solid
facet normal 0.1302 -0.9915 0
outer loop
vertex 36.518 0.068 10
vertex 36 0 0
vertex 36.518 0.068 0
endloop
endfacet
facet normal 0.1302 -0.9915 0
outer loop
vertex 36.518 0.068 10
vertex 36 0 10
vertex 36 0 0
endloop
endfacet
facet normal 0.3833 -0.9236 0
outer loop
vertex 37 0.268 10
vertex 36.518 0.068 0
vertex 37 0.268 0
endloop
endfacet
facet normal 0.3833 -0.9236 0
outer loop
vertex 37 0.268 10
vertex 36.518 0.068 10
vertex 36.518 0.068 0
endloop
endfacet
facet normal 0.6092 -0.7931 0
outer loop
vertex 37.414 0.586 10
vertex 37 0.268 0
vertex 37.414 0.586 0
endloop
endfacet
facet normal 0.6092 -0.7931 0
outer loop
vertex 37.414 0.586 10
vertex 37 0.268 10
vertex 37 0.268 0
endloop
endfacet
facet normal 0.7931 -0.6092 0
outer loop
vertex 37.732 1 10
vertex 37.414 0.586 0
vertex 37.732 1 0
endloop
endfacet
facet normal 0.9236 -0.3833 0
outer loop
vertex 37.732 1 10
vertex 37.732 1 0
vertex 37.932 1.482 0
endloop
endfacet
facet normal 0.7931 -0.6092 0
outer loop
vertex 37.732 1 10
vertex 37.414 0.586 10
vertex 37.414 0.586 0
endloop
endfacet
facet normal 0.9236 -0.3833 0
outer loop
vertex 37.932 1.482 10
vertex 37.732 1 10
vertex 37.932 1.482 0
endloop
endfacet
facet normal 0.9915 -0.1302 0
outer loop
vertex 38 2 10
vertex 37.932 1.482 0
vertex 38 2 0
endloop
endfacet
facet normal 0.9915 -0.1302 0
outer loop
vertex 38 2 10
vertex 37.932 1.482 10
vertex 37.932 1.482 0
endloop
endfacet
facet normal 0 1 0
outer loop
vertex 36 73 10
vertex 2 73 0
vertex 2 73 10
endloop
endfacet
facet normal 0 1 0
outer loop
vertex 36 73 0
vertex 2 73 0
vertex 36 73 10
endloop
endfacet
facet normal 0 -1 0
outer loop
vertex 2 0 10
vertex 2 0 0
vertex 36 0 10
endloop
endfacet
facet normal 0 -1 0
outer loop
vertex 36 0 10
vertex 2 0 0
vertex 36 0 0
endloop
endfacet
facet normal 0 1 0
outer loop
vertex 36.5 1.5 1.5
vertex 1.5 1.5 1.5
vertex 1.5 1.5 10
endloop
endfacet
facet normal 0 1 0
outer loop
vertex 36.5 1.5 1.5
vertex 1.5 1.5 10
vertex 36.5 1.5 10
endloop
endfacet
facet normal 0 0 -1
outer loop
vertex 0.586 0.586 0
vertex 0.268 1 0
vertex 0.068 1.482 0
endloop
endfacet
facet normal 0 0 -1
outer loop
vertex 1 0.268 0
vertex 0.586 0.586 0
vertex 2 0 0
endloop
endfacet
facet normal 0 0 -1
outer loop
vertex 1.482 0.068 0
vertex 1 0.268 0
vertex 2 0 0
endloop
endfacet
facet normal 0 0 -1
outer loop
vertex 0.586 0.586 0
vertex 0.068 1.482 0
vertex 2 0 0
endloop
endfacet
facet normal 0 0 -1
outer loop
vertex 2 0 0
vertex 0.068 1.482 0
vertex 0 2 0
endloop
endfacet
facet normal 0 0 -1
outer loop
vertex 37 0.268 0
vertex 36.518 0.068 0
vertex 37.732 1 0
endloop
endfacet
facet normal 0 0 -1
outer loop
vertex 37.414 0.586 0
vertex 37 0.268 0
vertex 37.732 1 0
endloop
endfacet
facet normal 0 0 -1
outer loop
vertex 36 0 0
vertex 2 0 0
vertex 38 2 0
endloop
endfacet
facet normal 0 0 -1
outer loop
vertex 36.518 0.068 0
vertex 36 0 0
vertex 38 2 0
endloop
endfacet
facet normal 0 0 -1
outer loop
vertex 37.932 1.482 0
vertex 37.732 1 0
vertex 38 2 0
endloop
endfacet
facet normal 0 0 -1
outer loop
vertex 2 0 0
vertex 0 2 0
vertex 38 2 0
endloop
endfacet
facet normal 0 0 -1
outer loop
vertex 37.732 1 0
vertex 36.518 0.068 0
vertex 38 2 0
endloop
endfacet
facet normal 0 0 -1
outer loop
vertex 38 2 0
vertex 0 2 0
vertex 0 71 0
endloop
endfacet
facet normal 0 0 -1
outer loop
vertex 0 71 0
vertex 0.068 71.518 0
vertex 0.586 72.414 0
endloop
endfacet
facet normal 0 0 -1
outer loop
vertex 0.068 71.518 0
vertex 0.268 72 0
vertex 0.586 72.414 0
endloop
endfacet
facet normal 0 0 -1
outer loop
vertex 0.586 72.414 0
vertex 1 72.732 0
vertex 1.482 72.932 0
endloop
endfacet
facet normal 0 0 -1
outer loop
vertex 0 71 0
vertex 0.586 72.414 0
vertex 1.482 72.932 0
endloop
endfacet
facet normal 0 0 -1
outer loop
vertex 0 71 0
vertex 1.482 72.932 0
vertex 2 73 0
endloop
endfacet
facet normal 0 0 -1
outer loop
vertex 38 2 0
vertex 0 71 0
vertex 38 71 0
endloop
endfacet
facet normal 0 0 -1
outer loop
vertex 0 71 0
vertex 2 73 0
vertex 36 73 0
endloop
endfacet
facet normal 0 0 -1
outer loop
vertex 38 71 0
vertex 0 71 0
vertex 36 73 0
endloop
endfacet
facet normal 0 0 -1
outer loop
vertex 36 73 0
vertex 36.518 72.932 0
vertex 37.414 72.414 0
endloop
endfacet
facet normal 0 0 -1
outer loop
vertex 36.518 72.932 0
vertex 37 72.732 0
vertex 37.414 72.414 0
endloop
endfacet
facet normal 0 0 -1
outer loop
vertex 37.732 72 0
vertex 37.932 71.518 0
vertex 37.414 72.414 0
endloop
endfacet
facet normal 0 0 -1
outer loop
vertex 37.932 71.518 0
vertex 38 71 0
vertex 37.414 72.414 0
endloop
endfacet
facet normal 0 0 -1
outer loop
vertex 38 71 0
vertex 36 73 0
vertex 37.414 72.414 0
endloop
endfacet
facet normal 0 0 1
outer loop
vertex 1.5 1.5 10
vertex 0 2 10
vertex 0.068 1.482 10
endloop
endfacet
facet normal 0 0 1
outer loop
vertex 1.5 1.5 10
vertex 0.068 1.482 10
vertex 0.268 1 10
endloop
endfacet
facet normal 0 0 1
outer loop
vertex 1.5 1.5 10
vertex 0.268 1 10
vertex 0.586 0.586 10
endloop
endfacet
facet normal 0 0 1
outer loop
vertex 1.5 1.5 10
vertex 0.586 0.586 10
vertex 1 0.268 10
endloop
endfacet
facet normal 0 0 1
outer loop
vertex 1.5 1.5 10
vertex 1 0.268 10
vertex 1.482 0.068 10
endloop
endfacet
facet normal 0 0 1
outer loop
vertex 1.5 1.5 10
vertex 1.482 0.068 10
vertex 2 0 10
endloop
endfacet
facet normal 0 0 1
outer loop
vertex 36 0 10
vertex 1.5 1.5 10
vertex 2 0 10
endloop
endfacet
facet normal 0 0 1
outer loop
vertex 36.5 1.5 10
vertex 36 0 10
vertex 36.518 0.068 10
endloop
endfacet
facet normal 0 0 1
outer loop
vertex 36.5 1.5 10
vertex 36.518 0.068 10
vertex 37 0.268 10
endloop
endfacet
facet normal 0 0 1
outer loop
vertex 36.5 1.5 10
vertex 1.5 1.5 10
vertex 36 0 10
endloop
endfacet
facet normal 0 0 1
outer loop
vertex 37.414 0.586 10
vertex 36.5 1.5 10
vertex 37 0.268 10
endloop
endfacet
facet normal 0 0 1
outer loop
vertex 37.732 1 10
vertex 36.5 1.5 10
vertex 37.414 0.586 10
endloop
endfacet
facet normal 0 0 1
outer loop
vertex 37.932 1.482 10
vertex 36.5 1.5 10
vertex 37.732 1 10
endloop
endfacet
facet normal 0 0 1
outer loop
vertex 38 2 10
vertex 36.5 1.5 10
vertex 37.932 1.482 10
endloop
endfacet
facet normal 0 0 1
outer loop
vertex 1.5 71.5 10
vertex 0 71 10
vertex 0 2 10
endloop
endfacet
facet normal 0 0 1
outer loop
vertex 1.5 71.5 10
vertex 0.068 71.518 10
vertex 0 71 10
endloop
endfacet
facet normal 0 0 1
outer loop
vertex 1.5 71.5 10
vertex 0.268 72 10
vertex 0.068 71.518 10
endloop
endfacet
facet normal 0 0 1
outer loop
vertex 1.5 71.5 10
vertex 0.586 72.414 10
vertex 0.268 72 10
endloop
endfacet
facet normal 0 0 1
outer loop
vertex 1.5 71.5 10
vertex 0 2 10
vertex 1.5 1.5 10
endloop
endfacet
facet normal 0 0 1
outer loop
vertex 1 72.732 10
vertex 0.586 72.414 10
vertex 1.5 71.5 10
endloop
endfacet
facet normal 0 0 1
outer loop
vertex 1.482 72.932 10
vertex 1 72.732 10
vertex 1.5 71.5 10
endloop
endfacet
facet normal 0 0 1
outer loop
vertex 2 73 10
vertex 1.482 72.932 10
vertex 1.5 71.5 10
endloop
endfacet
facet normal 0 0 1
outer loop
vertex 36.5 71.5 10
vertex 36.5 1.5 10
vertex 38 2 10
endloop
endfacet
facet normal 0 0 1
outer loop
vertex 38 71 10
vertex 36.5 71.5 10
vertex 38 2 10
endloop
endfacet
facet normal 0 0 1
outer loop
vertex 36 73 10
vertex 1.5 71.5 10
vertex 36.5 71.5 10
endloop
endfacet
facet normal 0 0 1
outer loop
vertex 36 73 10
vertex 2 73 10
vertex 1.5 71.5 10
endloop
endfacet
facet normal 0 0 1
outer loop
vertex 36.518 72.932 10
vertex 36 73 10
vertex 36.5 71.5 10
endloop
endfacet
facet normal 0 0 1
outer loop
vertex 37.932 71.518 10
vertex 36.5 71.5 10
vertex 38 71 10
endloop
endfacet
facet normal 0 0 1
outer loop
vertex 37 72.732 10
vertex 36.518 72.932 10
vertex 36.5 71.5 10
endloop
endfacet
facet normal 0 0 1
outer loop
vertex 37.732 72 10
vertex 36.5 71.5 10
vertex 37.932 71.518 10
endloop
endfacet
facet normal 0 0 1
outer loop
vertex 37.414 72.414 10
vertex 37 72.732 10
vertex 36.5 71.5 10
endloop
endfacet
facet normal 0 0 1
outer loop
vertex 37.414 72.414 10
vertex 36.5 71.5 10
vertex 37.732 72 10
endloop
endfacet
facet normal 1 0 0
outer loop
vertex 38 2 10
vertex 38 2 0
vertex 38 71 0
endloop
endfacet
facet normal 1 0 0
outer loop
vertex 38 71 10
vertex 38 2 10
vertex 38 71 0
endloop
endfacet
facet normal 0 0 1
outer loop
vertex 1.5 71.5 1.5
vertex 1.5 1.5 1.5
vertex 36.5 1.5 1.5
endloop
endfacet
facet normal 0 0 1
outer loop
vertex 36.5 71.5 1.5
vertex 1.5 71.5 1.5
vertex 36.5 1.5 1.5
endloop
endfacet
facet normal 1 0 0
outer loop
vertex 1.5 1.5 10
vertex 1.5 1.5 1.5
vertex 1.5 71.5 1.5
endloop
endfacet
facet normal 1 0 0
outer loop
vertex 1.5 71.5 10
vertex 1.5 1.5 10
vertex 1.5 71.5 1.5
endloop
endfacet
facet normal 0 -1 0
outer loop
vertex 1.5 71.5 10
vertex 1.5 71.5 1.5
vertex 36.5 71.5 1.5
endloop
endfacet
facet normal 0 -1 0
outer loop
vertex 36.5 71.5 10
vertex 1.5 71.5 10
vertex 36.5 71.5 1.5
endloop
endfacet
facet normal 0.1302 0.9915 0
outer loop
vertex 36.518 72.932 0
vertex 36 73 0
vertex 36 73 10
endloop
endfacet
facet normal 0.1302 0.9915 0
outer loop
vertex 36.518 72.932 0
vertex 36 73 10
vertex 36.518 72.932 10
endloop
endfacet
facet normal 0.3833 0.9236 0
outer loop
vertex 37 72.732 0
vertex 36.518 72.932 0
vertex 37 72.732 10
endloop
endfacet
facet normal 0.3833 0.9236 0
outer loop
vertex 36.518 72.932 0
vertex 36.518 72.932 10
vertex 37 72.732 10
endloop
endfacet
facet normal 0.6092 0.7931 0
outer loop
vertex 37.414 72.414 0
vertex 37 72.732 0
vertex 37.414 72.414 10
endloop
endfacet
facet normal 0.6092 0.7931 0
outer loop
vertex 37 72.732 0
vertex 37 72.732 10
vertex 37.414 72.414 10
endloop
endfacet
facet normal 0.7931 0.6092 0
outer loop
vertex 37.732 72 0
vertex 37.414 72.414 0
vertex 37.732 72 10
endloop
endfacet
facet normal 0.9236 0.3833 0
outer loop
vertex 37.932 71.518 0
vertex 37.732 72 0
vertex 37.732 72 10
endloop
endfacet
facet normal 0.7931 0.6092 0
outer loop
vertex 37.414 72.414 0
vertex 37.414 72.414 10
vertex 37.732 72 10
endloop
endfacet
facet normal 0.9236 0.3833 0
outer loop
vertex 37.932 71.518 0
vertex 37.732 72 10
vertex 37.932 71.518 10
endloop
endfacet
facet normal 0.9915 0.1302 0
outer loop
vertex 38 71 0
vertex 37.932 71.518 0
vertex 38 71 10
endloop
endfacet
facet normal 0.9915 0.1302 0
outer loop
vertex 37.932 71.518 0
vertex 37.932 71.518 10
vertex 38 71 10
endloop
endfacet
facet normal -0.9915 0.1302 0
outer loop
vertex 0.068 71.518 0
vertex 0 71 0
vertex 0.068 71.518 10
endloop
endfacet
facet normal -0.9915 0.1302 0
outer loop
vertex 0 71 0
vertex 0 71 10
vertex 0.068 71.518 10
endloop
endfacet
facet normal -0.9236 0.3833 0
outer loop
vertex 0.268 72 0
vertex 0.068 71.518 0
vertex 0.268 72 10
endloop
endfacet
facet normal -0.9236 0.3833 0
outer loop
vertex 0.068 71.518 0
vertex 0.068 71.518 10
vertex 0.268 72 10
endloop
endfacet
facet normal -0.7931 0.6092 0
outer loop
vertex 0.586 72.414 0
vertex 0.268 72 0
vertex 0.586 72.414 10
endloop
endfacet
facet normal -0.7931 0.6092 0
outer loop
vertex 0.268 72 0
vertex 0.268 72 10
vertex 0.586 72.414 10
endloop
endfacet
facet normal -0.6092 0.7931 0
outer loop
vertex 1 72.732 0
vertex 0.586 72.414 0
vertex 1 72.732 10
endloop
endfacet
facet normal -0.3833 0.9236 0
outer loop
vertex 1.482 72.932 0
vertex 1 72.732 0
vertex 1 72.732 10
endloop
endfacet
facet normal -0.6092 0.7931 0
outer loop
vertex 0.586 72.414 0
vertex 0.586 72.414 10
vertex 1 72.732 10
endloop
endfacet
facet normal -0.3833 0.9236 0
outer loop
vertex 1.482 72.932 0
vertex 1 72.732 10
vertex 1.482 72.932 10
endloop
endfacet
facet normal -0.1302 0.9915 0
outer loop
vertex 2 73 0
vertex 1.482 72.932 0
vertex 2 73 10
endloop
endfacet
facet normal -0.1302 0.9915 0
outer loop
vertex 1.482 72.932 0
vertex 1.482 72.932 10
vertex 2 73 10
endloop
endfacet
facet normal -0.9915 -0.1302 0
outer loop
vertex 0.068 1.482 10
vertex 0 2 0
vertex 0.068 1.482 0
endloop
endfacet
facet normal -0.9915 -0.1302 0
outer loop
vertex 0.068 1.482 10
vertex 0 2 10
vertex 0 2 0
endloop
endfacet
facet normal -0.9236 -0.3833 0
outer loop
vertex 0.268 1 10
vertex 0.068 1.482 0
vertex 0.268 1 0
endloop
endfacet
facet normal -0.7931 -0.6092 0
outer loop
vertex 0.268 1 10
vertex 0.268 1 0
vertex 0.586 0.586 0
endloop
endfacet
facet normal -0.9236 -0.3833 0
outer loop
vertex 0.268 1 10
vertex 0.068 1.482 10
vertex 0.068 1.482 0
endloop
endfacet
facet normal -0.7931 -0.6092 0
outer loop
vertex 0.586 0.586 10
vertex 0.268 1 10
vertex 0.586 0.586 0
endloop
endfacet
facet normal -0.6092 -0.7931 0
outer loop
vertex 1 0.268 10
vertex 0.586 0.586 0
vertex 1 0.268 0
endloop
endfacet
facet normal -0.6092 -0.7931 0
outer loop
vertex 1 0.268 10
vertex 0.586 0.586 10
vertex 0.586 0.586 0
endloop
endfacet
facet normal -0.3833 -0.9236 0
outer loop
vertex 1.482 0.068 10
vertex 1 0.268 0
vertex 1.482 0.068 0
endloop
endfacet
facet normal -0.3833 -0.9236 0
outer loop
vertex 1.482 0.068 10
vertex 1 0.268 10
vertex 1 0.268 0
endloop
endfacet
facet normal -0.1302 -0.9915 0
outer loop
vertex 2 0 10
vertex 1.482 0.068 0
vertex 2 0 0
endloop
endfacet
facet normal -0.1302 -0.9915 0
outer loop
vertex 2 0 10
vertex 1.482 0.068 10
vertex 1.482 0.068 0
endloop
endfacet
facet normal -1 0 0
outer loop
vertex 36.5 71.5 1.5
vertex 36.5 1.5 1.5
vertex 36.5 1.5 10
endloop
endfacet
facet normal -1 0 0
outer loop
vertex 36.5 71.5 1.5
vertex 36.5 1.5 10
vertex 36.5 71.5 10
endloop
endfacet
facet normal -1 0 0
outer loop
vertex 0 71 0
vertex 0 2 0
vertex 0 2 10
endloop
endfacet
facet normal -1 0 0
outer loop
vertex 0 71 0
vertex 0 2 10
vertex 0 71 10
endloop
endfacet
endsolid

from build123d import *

# Parameters (mm, degrees)
BOX001_W     = 35
BOX001_H     = 70
BOX001_DEPTH = 9
BOX_W        = 38
BOX_H        = 73
BOX_DEPTH    = 10
FILLET_R     = 2


with BuildPart() as interior:
    # Box001 → Box001 (new body)
    with BuildSketch(Plane(origin=(1.5, 1.5, 1.5), x_dir=(1, 0, 0), z_dir=(0, 0, 1))):
        with Locations((17.5, 35)):
            Rectangle(BOX001_W, BOX001_H)
    extrude(amount=BOX001_DEPTH)


with BuildPart() as caja_triangulosconstructivos_lado4cm:
    # Box → Box (new body)
    with BuildSketch(Plane.XY):
        with Locations((19, 36.5)):
            Rectangle(BOX_W, BOX_H)
    extrude(amount=BOX_DEPTH)

    # Cut: cut Interior
    add(interior.part, mode=Mode.SUBTRACT)

    # Fillet
    fillet_edges = [caja_triangulosconstructivos_lado4cm.edges().sort_by_distance(p)[0] for p in [
        (0, 0, 5),
        (0, 73, 5),
        (38, 0, 5),
        (38, 73, 5),
    ]]
    fillet(fillet_edges, radius=FILLET_R)


solid = caja_triangulosconstructivos_lado4cm.part
